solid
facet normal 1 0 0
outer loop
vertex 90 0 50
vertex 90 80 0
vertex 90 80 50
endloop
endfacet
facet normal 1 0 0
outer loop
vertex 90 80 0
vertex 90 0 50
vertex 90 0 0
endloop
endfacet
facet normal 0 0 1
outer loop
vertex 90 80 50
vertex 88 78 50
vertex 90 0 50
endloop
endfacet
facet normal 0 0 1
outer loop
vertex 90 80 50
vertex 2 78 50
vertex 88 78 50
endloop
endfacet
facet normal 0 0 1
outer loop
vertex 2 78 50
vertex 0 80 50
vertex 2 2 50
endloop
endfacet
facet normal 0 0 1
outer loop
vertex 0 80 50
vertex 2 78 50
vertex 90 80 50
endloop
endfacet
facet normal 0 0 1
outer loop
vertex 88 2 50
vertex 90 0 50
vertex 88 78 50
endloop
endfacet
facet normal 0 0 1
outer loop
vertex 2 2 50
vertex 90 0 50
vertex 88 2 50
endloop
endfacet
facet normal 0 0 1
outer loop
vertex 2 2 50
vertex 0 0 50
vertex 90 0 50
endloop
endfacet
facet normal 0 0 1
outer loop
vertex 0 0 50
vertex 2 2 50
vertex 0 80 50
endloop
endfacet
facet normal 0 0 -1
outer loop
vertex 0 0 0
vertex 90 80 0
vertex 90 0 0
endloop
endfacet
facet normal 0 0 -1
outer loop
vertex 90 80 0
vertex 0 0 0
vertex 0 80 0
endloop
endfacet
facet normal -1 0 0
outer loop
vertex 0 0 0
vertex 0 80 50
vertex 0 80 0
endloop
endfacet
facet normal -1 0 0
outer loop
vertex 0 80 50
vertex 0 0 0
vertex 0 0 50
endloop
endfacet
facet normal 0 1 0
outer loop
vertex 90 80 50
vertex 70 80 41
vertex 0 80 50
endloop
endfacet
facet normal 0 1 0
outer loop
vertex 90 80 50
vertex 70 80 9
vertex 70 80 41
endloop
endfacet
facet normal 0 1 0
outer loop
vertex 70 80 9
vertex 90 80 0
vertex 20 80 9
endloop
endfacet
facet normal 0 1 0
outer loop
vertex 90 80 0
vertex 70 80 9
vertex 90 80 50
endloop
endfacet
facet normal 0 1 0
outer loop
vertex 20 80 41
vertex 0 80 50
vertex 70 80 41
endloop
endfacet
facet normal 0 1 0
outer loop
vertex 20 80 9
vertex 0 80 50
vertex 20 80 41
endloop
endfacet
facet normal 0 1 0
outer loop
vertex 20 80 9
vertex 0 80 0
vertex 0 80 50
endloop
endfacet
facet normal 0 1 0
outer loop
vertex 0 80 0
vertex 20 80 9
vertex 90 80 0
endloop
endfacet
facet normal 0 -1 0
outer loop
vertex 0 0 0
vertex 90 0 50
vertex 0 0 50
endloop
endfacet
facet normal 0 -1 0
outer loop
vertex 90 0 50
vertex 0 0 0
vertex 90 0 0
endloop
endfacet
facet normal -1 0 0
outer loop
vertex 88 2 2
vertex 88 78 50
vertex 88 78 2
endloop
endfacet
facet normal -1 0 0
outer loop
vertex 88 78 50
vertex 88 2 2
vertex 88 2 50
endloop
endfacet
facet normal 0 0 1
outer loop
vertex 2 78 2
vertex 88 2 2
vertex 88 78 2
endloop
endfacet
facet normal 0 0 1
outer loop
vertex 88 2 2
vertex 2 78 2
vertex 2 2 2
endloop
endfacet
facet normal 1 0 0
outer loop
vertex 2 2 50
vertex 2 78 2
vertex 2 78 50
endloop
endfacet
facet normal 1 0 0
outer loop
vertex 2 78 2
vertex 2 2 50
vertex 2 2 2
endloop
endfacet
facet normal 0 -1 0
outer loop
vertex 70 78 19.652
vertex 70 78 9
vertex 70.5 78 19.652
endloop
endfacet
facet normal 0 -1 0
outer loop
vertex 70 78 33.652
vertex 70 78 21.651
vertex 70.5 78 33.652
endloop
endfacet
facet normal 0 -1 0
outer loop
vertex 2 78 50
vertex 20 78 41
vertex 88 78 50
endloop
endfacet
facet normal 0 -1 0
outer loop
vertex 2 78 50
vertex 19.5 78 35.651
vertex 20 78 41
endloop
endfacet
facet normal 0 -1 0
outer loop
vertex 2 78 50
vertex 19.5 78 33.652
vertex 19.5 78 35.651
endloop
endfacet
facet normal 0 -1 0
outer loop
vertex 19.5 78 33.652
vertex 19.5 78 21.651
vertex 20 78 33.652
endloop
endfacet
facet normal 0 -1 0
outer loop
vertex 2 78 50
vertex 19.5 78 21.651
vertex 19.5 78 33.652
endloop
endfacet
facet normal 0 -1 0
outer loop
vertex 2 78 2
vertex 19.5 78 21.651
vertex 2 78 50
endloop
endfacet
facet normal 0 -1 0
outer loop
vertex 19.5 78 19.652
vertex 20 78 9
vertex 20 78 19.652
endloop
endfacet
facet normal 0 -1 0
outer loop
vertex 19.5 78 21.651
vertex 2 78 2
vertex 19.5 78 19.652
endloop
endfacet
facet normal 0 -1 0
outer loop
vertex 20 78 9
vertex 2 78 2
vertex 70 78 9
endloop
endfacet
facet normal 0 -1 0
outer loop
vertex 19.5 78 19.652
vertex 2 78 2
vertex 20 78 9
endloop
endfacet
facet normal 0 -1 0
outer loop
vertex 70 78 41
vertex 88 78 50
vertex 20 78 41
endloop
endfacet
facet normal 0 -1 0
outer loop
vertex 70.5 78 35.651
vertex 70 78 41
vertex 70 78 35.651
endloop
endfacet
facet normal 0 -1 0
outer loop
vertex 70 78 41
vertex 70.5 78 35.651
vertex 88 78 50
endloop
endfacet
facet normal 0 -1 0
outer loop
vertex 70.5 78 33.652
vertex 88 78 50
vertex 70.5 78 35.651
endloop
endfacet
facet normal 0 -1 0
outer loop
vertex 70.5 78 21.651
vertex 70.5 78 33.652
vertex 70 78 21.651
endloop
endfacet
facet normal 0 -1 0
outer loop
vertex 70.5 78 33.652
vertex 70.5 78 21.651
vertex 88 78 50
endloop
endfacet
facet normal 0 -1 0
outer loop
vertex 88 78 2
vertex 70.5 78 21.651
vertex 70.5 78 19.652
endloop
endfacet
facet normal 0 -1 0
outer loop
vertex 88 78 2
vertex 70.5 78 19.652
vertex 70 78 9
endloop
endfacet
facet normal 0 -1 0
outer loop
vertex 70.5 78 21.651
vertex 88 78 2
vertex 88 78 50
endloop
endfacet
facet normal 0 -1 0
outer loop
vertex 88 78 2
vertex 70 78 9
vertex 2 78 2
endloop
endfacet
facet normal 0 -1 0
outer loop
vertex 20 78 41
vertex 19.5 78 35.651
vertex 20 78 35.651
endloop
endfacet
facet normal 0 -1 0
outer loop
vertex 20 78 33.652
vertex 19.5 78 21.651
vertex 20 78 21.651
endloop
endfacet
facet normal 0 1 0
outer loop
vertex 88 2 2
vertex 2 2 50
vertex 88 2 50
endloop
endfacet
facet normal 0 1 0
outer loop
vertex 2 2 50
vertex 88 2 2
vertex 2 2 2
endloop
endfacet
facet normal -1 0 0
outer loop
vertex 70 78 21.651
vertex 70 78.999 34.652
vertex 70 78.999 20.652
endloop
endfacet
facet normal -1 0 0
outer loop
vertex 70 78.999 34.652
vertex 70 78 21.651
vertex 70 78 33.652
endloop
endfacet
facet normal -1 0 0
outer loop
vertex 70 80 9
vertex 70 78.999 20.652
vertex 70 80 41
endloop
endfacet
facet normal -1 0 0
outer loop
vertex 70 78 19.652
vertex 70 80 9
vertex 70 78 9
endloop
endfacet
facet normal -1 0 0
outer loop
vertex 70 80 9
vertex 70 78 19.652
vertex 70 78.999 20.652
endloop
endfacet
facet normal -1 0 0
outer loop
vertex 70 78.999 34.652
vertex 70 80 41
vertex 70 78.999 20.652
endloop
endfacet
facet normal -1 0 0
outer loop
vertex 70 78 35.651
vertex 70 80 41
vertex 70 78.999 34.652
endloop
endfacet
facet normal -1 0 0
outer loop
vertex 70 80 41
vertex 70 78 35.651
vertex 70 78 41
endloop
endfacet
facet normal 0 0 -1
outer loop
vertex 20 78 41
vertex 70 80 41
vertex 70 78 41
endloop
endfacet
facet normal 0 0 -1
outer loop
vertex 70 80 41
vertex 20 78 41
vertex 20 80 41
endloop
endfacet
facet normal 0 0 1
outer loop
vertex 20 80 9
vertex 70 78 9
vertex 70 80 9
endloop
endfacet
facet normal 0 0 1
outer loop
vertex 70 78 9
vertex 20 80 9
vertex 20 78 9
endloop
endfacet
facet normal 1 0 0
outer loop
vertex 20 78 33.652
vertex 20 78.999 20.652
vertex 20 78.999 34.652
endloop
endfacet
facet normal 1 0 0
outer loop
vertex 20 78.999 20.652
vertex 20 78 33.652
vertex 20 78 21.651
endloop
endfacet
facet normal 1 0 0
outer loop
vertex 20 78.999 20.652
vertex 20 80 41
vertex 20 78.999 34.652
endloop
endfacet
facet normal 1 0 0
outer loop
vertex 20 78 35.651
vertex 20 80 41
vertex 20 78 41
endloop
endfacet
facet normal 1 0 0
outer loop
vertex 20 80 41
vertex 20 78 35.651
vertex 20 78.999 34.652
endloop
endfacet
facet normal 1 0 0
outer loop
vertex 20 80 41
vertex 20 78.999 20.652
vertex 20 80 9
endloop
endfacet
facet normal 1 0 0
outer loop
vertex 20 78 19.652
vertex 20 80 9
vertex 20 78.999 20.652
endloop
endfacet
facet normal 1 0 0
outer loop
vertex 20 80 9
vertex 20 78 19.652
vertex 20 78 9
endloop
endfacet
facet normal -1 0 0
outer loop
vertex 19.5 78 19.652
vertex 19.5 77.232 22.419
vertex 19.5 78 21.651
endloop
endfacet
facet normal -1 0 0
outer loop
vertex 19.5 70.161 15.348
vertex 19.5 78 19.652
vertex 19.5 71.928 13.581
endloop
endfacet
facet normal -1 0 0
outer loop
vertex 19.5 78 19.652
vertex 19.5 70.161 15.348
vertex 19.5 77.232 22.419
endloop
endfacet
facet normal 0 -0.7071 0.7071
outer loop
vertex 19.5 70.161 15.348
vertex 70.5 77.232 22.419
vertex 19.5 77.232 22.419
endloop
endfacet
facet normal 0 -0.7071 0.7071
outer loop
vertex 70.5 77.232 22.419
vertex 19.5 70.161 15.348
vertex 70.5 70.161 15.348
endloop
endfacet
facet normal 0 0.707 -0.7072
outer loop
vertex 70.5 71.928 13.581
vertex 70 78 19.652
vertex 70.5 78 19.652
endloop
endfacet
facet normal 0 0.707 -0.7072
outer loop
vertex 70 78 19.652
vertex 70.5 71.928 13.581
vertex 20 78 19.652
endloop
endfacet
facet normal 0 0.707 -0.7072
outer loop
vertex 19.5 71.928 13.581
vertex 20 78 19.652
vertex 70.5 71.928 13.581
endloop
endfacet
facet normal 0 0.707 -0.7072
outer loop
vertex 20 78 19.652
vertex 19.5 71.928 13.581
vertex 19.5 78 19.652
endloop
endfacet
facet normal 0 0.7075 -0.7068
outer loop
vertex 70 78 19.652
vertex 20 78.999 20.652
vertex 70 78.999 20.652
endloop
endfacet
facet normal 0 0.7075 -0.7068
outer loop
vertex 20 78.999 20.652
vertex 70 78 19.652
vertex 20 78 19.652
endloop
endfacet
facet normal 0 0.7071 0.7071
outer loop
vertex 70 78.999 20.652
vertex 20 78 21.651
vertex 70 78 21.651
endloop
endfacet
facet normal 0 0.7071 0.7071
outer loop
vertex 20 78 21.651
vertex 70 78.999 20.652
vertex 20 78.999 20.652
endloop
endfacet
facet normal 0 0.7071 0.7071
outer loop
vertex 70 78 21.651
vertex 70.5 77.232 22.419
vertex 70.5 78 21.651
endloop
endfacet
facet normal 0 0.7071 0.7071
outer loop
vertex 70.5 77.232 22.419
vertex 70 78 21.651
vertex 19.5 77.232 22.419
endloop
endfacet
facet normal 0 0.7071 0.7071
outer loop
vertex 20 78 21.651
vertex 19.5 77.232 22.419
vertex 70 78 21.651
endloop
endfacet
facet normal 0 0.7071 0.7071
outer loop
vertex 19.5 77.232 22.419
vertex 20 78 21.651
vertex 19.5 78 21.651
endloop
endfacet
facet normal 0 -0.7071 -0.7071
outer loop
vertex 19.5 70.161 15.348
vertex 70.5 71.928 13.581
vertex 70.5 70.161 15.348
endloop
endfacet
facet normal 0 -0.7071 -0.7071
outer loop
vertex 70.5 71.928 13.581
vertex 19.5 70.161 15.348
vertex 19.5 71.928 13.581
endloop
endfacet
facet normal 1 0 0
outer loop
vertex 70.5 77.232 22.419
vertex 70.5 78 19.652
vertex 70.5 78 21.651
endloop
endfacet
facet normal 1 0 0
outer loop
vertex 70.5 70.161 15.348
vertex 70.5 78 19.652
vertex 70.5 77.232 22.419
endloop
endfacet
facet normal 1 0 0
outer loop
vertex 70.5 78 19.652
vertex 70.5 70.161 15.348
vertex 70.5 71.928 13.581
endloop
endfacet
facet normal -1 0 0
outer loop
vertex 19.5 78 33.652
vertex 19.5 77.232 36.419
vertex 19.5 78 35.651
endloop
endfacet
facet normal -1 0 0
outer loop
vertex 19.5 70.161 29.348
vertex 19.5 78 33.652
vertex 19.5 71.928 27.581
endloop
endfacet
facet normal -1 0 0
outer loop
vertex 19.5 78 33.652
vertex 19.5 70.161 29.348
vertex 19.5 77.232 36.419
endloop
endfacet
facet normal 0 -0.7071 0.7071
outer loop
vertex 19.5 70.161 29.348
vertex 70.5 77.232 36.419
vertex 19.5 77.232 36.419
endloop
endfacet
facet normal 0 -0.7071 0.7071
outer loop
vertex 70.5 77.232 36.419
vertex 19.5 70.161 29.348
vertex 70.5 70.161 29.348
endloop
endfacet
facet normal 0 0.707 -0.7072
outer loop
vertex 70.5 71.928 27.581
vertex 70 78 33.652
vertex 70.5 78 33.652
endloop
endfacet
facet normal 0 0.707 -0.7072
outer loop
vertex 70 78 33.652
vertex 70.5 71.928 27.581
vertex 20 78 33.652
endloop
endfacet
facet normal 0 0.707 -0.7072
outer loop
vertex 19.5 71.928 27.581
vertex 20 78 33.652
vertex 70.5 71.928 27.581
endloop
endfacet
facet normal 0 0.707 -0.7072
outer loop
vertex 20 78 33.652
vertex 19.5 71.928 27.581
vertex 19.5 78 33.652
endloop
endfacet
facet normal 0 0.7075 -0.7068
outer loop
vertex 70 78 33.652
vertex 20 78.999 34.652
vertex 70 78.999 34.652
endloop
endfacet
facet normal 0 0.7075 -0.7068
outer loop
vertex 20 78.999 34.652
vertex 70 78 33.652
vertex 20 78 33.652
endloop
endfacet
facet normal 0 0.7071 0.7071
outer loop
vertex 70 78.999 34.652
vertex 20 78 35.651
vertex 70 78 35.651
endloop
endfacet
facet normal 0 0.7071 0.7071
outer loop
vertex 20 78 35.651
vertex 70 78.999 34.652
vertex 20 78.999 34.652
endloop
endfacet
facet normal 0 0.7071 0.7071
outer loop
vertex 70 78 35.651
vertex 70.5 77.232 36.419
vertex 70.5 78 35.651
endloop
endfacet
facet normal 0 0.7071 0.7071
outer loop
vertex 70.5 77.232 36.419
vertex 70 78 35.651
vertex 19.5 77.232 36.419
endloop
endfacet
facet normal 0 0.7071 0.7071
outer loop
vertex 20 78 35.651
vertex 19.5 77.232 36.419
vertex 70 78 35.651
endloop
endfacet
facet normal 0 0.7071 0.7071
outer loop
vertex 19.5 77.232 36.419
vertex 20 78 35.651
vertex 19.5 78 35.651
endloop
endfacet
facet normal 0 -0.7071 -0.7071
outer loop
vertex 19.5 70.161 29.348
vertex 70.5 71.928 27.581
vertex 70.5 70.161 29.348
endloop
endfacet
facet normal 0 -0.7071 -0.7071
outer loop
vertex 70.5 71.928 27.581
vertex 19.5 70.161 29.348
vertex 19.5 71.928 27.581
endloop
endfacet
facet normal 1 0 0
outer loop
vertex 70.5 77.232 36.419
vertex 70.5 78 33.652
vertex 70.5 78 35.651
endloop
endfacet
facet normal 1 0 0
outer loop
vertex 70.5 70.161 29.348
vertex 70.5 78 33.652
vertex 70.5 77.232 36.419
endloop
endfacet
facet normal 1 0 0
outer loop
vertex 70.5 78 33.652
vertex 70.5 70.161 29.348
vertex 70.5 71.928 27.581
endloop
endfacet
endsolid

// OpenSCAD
$fn = 32;

// ----------------------------------------------------------------------
// Vent box: louvers enclosure
// ----------------------------------------------------------------------

// --- parameters (mm) ---
box_l = 90;               // box length, X
box_w = 80;               // box width, Y
box_h = 50;               // box height, Z
wall_t = 2;               // shell wall thickness
win_l = 50;               // vent window width, X
win_h = 32;               // vent window height, Z
slat_t = 2.5;             // louver slat thickness
slat_d = 10;              // louver slat depth
slat_a = 45;              // louver slat angle, degrees
slat_pitch = 14;          // louver pitch
slat_yc = 74.58;          // slat centreline Y

win_z0 = (box_h - win_h) / 2;  // window lower edge Z
n_slats = 2;  // louver count
slat_z0 = win_z0 + (win_h - (n_slats - 1) * slat_pitch) / 2;

difference() {
  union() {
    difference() {
      cube([box_l, box_w, box_h]);
  translate([wall_t, wall_t, wall_t])
    cube([box_l - 2 * wall_t, box_w - 2 * wall_t, box_h]);
  translate([(box_l - win_l) / 2, box_w - wall_t - 1, win_z0])
    cube([win_l, wall_t + 2, win_h]);
    }
    for (i = [0 : n_slats - 1])
      translate([box_l / 2, slat_yc, slat_z0 + i * slat_pitch])
        rotate([slat_a, 0, 0])
          cube([win_l + 1, slat_d, slat_t], center = true);
  }
}
